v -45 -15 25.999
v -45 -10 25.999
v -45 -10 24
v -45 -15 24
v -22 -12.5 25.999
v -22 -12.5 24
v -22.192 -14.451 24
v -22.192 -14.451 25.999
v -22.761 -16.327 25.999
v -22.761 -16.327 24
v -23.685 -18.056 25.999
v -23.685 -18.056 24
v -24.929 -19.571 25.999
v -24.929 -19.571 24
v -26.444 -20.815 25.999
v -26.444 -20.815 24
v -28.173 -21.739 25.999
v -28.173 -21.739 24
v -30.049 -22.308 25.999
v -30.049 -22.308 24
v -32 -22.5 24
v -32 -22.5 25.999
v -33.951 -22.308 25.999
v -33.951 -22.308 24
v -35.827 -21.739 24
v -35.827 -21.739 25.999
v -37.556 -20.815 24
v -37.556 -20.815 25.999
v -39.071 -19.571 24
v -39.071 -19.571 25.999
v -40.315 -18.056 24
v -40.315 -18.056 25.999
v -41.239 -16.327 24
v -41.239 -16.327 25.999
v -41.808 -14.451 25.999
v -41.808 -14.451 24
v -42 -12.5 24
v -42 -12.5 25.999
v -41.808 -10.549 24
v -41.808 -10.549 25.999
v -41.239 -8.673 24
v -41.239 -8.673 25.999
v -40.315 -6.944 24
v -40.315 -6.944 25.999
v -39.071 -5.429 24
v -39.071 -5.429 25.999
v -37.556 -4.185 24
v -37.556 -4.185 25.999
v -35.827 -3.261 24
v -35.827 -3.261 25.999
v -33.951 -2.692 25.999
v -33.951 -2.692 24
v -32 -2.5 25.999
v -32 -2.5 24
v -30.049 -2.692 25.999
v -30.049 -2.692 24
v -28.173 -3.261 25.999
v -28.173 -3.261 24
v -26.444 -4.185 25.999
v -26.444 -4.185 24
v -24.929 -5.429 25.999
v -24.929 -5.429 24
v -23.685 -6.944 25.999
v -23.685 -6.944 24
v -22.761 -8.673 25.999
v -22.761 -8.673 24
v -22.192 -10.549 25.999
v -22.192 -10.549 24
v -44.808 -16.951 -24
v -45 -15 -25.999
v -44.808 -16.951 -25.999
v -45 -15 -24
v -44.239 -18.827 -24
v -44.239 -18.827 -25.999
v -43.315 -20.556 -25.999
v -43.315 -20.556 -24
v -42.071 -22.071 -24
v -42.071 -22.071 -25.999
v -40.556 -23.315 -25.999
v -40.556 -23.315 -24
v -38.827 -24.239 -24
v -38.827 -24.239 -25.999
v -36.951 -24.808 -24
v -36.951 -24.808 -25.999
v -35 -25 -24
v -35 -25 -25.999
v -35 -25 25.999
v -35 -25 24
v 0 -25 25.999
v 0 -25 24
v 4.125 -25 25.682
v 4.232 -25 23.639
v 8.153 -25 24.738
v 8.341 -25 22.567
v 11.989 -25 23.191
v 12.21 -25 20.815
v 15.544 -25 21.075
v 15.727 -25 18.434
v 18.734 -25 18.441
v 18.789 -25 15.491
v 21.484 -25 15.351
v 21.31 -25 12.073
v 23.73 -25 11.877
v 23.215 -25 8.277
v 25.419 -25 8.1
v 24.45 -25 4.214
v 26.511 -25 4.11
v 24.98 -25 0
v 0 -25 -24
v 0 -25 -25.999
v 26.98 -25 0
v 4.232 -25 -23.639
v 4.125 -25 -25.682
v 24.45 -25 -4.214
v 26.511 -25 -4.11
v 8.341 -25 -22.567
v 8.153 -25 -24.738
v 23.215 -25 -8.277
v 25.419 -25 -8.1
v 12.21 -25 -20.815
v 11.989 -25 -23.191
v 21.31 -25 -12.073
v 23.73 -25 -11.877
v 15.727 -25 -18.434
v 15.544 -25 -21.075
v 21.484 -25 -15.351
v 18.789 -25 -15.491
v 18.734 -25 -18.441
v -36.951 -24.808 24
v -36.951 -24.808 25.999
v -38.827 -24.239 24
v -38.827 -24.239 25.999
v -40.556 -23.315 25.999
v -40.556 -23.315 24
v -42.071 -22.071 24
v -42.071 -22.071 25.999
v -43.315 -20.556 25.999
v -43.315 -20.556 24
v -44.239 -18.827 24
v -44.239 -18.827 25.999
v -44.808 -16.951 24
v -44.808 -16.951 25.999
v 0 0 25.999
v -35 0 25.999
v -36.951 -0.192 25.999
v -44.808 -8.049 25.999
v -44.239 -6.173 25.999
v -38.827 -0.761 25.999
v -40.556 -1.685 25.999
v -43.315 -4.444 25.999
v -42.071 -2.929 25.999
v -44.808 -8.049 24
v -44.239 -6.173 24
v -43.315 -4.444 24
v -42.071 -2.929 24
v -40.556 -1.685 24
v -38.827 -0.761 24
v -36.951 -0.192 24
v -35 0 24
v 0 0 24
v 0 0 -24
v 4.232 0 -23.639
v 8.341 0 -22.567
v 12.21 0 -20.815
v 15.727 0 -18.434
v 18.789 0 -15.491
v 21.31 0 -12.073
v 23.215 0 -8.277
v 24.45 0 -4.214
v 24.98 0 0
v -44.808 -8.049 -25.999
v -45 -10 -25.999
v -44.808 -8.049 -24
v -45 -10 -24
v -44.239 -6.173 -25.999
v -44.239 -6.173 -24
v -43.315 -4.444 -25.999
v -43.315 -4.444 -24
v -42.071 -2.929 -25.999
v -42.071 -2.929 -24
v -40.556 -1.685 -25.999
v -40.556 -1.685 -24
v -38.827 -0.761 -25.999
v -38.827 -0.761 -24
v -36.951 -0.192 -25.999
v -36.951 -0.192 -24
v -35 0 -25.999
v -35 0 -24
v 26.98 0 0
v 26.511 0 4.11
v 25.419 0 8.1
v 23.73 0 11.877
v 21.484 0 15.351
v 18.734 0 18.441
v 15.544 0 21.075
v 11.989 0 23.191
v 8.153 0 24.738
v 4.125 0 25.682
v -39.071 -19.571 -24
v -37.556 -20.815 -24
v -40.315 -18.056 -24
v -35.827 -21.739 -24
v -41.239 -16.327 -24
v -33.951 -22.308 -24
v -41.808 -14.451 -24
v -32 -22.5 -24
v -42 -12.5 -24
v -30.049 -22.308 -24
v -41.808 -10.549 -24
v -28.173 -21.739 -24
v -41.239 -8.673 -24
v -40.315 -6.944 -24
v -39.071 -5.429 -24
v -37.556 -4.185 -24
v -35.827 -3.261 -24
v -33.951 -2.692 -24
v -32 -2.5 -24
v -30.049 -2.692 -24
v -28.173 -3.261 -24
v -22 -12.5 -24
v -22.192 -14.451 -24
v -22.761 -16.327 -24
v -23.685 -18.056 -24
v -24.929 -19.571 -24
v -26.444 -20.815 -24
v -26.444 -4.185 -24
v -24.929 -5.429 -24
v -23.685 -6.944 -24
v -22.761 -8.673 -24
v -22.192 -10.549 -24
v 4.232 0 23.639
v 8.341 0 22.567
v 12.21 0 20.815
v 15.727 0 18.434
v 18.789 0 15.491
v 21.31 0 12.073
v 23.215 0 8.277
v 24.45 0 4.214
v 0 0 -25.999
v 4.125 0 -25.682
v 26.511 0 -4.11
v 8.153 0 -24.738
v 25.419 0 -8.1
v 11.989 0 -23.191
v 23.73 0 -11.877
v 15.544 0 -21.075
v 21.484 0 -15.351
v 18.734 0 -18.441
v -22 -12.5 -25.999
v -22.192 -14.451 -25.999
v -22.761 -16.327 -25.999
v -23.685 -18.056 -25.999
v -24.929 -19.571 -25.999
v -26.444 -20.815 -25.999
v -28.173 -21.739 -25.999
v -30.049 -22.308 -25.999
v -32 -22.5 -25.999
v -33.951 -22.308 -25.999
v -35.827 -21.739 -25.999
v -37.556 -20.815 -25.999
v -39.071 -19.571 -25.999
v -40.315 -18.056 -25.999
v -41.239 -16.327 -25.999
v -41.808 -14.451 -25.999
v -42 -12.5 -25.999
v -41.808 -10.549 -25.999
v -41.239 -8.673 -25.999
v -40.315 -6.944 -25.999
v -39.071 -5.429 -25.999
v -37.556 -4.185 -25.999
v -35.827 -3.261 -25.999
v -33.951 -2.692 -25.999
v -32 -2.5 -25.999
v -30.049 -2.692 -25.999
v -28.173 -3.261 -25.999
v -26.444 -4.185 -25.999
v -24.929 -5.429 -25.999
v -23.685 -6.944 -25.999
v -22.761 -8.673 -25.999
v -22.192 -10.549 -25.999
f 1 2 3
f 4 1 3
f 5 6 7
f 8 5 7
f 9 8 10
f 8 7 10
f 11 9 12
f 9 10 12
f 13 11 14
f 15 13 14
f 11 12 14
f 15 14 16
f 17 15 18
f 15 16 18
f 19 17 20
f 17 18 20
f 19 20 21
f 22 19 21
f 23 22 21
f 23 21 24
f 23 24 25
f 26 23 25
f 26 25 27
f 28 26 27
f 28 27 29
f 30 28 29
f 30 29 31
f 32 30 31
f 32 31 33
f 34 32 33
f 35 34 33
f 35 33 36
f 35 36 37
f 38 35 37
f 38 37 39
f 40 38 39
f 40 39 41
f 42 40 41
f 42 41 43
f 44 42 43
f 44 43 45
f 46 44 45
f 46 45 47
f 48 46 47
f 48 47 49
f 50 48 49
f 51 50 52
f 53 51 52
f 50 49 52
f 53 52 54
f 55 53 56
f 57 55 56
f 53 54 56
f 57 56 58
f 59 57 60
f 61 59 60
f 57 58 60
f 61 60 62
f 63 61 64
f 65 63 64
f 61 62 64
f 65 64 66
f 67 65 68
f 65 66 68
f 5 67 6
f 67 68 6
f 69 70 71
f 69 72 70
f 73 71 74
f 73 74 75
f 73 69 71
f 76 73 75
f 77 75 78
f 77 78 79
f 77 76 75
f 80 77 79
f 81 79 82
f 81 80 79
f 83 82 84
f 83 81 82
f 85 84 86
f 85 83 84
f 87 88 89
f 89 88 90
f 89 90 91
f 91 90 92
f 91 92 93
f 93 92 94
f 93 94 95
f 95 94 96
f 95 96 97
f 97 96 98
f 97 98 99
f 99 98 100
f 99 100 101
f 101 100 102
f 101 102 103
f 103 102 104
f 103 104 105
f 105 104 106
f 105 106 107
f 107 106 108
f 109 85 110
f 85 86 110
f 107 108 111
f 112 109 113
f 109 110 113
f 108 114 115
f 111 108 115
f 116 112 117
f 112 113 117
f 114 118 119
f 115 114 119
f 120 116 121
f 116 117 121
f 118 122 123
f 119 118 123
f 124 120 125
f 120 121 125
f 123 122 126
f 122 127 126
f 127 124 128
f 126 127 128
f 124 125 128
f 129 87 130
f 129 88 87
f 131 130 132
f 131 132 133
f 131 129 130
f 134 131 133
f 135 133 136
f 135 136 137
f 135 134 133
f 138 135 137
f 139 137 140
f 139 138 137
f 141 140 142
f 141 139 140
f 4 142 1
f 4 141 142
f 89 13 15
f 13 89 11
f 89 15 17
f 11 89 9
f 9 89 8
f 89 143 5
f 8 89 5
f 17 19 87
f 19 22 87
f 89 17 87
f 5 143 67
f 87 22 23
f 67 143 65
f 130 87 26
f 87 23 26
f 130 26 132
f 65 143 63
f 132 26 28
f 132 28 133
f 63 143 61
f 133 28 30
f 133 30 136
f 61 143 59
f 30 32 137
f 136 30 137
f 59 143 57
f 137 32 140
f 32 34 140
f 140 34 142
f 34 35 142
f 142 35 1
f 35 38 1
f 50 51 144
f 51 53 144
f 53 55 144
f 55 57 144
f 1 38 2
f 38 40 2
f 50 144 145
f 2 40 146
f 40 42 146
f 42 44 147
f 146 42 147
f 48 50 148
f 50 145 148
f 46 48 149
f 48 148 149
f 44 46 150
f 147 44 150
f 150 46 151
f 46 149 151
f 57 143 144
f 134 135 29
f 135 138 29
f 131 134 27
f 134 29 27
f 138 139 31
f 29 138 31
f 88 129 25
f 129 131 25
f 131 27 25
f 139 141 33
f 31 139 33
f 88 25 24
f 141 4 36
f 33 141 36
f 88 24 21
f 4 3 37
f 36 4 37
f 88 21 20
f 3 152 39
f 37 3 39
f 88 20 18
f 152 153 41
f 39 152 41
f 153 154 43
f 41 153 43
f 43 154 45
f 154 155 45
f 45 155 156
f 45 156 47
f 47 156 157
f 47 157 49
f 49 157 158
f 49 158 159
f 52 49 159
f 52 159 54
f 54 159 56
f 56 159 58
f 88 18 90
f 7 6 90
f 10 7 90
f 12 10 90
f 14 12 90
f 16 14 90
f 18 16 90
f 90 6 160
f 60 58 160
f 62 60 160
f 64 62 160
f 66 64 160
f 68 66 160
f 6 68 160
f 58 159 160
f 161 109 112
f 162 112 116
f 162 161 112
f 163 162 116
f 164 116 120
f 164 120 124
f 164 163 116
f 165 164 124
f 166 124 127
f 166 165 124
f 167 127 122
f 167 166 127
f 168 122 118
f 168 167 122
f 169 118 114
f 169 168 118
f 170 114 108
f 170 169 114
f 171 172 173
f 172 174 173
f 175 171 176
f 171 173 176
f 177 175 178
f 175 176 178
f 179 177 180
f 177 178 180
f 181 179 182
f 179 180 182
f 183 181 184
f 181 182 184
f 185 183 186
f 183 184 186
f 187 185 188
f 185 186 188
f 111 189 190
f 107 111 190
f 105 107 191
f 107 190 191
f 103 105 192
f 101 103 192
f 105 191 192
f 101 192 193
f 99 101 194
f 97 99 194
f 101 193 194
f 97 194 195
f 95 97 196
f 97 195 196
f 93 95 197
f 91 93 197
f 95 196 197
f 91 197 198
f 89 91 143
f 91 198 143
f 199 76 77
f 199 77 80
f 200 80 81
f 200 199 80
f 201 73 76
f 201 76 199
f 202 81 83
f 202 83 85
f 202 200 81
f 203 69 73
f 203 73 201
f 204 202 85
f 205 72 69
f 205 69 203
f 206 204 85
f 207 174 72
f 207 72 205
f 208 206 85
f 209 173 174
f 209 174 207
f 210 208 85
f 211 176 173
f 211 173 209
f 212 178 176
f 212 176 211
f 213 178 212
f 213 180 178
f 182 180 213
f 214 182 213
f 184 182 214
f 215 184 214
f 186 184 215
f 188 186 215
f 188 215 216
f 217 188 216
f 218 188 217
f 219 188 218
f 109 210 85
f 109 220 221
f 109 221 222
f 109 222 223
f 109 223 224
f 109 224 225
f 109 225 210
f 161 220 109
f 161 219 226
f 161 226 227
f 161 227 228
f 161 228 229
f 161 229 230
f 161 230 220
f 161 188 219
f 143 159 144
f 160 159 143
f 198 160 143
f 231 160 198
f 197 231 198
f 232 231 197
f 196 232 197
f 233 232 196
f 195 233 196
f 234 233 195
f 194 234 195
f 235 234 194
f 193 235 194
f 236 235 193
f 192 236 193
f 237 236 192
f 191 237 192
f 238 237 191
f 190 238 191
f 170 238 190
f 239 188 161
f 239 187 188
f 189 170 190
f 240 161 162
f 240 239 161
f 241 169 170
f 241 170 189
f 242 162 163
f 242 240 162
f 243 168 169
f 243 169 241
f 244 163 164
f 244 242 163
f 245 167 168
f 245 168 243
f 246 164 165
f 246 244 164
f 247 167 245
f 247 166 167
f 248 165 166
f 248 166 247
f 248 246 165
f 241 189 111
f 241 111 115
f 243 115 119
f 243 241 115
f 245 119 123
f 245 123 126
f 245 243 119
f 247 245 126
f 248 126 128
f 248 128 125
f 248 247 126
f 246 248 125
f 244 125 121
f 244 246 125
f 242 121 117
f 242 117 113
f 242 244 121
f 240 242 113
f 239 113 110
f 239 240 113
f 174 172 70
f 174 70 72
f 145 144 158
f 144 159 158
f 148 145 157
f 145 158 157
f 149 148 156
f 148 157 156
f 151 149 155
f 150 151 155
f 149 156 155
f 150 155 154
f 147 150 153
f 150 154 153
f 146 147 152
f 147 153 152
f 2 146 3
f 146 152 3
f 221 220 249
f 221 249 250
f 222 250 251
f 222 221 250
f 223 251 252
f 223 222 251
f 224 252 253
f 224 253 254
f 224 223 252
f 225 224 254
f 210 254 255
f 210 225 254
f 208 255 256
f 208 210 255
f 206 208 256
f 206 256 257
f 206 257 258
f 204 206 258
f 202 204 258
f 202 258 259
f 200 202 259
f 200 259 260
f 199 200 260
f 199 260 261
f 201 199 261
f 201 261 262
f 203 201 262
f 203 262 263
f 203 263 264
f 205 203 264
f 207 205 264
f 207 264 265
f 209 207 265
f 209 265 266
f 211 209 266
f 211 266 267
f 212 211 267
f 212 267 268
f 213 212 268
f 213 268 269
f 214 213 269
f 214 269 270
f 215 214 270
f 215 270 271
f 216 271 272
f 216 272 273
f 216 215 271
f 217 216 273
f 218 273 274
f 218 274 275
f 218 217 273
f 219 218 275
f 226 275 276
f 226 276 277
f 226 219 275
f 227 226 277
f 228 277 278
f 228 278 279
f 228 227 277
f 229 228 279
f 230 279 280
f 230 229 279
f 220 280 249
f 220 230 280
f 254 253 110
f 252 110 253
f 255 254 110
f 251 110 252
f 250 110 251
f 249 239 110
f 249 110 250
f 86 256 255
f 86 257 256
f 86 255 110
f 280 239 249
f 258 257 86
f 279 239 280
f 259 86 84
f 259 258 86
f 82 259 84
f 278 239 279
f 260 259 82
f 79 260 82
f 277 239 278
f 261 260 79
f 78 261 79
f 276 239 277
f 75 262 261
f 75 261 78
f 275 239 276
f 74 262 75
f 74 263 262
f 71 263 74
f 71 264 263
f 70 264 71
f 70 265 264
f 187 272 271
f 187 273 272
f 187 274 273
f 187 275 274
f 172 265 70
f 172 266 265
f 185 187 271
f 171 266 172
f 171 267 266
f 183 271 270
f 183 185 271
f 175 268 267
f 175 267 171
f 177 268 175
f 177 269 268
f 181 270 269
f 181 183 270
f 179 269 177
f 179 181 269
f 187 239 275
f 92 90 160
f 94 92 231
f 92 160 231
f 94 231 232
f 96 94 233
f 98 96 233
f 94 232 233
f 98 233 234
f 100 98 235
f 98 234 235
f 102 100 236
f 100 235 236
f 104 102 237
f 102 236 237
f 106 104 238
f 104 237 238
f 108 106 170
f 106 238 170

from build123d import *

# Parameters (mm, degrees)
F1_DEPTH = 25
F2_R     = 10
F3_DEPTH = 1.9995178848
F5_R     = 10


with BuildPart() as f1:
    # F0 (on Front) → F1 (new body)
    with BuildSketch(Plane.XZ):
        with BuildLine():
            Line((-45, 25.9985178848), (-45, 24))
            Line((-45, 24), (0, 24))
            ThreePointArc((0, 24), (17.3205080757, 17.0277563773), (24.9799919936, 0))
            Line((24.9799919936, 0), (26.9799919936, 0))
            ThreePointArc((26.9799919936, 0), (18.7339457949, 18.4411739082), (0, 25.9985178848))
            Line((0, 25.9985178848), (-45, 25.9985178848))
        make_face()
    extrude(amount=F1_DEPTH)

    # F2 (on face) → F3 (cut, through all)
    with BuildSketch(Plane(origin=(0, 0, 24), x_dir=(1, 0, 0), z_dir=(0, 0, -1))):
        with Locations((-32, 12.5)):
            Circle(F2_R)
    extrude(amount=-F3_DEPTH, mode=Mode.SUBTRACT)

    # F4: F1 across plane


with BuildPart() as f1_1:
    add(f1.part)
    add(f1.part.mirror(Plane.XY))

    # F5
    f5_edges = [f1_1.edges().sort_by_distance(p)[0] for p in [
        (-45, -25, 24.999259),
        (-45, -25, -24.999259),
        (-45, 0, -24.999259),
        (-45, 0, 24.999259),
    ]]
    fillet(f5_edges, radius=F5_R)


solid = f1_1.part
